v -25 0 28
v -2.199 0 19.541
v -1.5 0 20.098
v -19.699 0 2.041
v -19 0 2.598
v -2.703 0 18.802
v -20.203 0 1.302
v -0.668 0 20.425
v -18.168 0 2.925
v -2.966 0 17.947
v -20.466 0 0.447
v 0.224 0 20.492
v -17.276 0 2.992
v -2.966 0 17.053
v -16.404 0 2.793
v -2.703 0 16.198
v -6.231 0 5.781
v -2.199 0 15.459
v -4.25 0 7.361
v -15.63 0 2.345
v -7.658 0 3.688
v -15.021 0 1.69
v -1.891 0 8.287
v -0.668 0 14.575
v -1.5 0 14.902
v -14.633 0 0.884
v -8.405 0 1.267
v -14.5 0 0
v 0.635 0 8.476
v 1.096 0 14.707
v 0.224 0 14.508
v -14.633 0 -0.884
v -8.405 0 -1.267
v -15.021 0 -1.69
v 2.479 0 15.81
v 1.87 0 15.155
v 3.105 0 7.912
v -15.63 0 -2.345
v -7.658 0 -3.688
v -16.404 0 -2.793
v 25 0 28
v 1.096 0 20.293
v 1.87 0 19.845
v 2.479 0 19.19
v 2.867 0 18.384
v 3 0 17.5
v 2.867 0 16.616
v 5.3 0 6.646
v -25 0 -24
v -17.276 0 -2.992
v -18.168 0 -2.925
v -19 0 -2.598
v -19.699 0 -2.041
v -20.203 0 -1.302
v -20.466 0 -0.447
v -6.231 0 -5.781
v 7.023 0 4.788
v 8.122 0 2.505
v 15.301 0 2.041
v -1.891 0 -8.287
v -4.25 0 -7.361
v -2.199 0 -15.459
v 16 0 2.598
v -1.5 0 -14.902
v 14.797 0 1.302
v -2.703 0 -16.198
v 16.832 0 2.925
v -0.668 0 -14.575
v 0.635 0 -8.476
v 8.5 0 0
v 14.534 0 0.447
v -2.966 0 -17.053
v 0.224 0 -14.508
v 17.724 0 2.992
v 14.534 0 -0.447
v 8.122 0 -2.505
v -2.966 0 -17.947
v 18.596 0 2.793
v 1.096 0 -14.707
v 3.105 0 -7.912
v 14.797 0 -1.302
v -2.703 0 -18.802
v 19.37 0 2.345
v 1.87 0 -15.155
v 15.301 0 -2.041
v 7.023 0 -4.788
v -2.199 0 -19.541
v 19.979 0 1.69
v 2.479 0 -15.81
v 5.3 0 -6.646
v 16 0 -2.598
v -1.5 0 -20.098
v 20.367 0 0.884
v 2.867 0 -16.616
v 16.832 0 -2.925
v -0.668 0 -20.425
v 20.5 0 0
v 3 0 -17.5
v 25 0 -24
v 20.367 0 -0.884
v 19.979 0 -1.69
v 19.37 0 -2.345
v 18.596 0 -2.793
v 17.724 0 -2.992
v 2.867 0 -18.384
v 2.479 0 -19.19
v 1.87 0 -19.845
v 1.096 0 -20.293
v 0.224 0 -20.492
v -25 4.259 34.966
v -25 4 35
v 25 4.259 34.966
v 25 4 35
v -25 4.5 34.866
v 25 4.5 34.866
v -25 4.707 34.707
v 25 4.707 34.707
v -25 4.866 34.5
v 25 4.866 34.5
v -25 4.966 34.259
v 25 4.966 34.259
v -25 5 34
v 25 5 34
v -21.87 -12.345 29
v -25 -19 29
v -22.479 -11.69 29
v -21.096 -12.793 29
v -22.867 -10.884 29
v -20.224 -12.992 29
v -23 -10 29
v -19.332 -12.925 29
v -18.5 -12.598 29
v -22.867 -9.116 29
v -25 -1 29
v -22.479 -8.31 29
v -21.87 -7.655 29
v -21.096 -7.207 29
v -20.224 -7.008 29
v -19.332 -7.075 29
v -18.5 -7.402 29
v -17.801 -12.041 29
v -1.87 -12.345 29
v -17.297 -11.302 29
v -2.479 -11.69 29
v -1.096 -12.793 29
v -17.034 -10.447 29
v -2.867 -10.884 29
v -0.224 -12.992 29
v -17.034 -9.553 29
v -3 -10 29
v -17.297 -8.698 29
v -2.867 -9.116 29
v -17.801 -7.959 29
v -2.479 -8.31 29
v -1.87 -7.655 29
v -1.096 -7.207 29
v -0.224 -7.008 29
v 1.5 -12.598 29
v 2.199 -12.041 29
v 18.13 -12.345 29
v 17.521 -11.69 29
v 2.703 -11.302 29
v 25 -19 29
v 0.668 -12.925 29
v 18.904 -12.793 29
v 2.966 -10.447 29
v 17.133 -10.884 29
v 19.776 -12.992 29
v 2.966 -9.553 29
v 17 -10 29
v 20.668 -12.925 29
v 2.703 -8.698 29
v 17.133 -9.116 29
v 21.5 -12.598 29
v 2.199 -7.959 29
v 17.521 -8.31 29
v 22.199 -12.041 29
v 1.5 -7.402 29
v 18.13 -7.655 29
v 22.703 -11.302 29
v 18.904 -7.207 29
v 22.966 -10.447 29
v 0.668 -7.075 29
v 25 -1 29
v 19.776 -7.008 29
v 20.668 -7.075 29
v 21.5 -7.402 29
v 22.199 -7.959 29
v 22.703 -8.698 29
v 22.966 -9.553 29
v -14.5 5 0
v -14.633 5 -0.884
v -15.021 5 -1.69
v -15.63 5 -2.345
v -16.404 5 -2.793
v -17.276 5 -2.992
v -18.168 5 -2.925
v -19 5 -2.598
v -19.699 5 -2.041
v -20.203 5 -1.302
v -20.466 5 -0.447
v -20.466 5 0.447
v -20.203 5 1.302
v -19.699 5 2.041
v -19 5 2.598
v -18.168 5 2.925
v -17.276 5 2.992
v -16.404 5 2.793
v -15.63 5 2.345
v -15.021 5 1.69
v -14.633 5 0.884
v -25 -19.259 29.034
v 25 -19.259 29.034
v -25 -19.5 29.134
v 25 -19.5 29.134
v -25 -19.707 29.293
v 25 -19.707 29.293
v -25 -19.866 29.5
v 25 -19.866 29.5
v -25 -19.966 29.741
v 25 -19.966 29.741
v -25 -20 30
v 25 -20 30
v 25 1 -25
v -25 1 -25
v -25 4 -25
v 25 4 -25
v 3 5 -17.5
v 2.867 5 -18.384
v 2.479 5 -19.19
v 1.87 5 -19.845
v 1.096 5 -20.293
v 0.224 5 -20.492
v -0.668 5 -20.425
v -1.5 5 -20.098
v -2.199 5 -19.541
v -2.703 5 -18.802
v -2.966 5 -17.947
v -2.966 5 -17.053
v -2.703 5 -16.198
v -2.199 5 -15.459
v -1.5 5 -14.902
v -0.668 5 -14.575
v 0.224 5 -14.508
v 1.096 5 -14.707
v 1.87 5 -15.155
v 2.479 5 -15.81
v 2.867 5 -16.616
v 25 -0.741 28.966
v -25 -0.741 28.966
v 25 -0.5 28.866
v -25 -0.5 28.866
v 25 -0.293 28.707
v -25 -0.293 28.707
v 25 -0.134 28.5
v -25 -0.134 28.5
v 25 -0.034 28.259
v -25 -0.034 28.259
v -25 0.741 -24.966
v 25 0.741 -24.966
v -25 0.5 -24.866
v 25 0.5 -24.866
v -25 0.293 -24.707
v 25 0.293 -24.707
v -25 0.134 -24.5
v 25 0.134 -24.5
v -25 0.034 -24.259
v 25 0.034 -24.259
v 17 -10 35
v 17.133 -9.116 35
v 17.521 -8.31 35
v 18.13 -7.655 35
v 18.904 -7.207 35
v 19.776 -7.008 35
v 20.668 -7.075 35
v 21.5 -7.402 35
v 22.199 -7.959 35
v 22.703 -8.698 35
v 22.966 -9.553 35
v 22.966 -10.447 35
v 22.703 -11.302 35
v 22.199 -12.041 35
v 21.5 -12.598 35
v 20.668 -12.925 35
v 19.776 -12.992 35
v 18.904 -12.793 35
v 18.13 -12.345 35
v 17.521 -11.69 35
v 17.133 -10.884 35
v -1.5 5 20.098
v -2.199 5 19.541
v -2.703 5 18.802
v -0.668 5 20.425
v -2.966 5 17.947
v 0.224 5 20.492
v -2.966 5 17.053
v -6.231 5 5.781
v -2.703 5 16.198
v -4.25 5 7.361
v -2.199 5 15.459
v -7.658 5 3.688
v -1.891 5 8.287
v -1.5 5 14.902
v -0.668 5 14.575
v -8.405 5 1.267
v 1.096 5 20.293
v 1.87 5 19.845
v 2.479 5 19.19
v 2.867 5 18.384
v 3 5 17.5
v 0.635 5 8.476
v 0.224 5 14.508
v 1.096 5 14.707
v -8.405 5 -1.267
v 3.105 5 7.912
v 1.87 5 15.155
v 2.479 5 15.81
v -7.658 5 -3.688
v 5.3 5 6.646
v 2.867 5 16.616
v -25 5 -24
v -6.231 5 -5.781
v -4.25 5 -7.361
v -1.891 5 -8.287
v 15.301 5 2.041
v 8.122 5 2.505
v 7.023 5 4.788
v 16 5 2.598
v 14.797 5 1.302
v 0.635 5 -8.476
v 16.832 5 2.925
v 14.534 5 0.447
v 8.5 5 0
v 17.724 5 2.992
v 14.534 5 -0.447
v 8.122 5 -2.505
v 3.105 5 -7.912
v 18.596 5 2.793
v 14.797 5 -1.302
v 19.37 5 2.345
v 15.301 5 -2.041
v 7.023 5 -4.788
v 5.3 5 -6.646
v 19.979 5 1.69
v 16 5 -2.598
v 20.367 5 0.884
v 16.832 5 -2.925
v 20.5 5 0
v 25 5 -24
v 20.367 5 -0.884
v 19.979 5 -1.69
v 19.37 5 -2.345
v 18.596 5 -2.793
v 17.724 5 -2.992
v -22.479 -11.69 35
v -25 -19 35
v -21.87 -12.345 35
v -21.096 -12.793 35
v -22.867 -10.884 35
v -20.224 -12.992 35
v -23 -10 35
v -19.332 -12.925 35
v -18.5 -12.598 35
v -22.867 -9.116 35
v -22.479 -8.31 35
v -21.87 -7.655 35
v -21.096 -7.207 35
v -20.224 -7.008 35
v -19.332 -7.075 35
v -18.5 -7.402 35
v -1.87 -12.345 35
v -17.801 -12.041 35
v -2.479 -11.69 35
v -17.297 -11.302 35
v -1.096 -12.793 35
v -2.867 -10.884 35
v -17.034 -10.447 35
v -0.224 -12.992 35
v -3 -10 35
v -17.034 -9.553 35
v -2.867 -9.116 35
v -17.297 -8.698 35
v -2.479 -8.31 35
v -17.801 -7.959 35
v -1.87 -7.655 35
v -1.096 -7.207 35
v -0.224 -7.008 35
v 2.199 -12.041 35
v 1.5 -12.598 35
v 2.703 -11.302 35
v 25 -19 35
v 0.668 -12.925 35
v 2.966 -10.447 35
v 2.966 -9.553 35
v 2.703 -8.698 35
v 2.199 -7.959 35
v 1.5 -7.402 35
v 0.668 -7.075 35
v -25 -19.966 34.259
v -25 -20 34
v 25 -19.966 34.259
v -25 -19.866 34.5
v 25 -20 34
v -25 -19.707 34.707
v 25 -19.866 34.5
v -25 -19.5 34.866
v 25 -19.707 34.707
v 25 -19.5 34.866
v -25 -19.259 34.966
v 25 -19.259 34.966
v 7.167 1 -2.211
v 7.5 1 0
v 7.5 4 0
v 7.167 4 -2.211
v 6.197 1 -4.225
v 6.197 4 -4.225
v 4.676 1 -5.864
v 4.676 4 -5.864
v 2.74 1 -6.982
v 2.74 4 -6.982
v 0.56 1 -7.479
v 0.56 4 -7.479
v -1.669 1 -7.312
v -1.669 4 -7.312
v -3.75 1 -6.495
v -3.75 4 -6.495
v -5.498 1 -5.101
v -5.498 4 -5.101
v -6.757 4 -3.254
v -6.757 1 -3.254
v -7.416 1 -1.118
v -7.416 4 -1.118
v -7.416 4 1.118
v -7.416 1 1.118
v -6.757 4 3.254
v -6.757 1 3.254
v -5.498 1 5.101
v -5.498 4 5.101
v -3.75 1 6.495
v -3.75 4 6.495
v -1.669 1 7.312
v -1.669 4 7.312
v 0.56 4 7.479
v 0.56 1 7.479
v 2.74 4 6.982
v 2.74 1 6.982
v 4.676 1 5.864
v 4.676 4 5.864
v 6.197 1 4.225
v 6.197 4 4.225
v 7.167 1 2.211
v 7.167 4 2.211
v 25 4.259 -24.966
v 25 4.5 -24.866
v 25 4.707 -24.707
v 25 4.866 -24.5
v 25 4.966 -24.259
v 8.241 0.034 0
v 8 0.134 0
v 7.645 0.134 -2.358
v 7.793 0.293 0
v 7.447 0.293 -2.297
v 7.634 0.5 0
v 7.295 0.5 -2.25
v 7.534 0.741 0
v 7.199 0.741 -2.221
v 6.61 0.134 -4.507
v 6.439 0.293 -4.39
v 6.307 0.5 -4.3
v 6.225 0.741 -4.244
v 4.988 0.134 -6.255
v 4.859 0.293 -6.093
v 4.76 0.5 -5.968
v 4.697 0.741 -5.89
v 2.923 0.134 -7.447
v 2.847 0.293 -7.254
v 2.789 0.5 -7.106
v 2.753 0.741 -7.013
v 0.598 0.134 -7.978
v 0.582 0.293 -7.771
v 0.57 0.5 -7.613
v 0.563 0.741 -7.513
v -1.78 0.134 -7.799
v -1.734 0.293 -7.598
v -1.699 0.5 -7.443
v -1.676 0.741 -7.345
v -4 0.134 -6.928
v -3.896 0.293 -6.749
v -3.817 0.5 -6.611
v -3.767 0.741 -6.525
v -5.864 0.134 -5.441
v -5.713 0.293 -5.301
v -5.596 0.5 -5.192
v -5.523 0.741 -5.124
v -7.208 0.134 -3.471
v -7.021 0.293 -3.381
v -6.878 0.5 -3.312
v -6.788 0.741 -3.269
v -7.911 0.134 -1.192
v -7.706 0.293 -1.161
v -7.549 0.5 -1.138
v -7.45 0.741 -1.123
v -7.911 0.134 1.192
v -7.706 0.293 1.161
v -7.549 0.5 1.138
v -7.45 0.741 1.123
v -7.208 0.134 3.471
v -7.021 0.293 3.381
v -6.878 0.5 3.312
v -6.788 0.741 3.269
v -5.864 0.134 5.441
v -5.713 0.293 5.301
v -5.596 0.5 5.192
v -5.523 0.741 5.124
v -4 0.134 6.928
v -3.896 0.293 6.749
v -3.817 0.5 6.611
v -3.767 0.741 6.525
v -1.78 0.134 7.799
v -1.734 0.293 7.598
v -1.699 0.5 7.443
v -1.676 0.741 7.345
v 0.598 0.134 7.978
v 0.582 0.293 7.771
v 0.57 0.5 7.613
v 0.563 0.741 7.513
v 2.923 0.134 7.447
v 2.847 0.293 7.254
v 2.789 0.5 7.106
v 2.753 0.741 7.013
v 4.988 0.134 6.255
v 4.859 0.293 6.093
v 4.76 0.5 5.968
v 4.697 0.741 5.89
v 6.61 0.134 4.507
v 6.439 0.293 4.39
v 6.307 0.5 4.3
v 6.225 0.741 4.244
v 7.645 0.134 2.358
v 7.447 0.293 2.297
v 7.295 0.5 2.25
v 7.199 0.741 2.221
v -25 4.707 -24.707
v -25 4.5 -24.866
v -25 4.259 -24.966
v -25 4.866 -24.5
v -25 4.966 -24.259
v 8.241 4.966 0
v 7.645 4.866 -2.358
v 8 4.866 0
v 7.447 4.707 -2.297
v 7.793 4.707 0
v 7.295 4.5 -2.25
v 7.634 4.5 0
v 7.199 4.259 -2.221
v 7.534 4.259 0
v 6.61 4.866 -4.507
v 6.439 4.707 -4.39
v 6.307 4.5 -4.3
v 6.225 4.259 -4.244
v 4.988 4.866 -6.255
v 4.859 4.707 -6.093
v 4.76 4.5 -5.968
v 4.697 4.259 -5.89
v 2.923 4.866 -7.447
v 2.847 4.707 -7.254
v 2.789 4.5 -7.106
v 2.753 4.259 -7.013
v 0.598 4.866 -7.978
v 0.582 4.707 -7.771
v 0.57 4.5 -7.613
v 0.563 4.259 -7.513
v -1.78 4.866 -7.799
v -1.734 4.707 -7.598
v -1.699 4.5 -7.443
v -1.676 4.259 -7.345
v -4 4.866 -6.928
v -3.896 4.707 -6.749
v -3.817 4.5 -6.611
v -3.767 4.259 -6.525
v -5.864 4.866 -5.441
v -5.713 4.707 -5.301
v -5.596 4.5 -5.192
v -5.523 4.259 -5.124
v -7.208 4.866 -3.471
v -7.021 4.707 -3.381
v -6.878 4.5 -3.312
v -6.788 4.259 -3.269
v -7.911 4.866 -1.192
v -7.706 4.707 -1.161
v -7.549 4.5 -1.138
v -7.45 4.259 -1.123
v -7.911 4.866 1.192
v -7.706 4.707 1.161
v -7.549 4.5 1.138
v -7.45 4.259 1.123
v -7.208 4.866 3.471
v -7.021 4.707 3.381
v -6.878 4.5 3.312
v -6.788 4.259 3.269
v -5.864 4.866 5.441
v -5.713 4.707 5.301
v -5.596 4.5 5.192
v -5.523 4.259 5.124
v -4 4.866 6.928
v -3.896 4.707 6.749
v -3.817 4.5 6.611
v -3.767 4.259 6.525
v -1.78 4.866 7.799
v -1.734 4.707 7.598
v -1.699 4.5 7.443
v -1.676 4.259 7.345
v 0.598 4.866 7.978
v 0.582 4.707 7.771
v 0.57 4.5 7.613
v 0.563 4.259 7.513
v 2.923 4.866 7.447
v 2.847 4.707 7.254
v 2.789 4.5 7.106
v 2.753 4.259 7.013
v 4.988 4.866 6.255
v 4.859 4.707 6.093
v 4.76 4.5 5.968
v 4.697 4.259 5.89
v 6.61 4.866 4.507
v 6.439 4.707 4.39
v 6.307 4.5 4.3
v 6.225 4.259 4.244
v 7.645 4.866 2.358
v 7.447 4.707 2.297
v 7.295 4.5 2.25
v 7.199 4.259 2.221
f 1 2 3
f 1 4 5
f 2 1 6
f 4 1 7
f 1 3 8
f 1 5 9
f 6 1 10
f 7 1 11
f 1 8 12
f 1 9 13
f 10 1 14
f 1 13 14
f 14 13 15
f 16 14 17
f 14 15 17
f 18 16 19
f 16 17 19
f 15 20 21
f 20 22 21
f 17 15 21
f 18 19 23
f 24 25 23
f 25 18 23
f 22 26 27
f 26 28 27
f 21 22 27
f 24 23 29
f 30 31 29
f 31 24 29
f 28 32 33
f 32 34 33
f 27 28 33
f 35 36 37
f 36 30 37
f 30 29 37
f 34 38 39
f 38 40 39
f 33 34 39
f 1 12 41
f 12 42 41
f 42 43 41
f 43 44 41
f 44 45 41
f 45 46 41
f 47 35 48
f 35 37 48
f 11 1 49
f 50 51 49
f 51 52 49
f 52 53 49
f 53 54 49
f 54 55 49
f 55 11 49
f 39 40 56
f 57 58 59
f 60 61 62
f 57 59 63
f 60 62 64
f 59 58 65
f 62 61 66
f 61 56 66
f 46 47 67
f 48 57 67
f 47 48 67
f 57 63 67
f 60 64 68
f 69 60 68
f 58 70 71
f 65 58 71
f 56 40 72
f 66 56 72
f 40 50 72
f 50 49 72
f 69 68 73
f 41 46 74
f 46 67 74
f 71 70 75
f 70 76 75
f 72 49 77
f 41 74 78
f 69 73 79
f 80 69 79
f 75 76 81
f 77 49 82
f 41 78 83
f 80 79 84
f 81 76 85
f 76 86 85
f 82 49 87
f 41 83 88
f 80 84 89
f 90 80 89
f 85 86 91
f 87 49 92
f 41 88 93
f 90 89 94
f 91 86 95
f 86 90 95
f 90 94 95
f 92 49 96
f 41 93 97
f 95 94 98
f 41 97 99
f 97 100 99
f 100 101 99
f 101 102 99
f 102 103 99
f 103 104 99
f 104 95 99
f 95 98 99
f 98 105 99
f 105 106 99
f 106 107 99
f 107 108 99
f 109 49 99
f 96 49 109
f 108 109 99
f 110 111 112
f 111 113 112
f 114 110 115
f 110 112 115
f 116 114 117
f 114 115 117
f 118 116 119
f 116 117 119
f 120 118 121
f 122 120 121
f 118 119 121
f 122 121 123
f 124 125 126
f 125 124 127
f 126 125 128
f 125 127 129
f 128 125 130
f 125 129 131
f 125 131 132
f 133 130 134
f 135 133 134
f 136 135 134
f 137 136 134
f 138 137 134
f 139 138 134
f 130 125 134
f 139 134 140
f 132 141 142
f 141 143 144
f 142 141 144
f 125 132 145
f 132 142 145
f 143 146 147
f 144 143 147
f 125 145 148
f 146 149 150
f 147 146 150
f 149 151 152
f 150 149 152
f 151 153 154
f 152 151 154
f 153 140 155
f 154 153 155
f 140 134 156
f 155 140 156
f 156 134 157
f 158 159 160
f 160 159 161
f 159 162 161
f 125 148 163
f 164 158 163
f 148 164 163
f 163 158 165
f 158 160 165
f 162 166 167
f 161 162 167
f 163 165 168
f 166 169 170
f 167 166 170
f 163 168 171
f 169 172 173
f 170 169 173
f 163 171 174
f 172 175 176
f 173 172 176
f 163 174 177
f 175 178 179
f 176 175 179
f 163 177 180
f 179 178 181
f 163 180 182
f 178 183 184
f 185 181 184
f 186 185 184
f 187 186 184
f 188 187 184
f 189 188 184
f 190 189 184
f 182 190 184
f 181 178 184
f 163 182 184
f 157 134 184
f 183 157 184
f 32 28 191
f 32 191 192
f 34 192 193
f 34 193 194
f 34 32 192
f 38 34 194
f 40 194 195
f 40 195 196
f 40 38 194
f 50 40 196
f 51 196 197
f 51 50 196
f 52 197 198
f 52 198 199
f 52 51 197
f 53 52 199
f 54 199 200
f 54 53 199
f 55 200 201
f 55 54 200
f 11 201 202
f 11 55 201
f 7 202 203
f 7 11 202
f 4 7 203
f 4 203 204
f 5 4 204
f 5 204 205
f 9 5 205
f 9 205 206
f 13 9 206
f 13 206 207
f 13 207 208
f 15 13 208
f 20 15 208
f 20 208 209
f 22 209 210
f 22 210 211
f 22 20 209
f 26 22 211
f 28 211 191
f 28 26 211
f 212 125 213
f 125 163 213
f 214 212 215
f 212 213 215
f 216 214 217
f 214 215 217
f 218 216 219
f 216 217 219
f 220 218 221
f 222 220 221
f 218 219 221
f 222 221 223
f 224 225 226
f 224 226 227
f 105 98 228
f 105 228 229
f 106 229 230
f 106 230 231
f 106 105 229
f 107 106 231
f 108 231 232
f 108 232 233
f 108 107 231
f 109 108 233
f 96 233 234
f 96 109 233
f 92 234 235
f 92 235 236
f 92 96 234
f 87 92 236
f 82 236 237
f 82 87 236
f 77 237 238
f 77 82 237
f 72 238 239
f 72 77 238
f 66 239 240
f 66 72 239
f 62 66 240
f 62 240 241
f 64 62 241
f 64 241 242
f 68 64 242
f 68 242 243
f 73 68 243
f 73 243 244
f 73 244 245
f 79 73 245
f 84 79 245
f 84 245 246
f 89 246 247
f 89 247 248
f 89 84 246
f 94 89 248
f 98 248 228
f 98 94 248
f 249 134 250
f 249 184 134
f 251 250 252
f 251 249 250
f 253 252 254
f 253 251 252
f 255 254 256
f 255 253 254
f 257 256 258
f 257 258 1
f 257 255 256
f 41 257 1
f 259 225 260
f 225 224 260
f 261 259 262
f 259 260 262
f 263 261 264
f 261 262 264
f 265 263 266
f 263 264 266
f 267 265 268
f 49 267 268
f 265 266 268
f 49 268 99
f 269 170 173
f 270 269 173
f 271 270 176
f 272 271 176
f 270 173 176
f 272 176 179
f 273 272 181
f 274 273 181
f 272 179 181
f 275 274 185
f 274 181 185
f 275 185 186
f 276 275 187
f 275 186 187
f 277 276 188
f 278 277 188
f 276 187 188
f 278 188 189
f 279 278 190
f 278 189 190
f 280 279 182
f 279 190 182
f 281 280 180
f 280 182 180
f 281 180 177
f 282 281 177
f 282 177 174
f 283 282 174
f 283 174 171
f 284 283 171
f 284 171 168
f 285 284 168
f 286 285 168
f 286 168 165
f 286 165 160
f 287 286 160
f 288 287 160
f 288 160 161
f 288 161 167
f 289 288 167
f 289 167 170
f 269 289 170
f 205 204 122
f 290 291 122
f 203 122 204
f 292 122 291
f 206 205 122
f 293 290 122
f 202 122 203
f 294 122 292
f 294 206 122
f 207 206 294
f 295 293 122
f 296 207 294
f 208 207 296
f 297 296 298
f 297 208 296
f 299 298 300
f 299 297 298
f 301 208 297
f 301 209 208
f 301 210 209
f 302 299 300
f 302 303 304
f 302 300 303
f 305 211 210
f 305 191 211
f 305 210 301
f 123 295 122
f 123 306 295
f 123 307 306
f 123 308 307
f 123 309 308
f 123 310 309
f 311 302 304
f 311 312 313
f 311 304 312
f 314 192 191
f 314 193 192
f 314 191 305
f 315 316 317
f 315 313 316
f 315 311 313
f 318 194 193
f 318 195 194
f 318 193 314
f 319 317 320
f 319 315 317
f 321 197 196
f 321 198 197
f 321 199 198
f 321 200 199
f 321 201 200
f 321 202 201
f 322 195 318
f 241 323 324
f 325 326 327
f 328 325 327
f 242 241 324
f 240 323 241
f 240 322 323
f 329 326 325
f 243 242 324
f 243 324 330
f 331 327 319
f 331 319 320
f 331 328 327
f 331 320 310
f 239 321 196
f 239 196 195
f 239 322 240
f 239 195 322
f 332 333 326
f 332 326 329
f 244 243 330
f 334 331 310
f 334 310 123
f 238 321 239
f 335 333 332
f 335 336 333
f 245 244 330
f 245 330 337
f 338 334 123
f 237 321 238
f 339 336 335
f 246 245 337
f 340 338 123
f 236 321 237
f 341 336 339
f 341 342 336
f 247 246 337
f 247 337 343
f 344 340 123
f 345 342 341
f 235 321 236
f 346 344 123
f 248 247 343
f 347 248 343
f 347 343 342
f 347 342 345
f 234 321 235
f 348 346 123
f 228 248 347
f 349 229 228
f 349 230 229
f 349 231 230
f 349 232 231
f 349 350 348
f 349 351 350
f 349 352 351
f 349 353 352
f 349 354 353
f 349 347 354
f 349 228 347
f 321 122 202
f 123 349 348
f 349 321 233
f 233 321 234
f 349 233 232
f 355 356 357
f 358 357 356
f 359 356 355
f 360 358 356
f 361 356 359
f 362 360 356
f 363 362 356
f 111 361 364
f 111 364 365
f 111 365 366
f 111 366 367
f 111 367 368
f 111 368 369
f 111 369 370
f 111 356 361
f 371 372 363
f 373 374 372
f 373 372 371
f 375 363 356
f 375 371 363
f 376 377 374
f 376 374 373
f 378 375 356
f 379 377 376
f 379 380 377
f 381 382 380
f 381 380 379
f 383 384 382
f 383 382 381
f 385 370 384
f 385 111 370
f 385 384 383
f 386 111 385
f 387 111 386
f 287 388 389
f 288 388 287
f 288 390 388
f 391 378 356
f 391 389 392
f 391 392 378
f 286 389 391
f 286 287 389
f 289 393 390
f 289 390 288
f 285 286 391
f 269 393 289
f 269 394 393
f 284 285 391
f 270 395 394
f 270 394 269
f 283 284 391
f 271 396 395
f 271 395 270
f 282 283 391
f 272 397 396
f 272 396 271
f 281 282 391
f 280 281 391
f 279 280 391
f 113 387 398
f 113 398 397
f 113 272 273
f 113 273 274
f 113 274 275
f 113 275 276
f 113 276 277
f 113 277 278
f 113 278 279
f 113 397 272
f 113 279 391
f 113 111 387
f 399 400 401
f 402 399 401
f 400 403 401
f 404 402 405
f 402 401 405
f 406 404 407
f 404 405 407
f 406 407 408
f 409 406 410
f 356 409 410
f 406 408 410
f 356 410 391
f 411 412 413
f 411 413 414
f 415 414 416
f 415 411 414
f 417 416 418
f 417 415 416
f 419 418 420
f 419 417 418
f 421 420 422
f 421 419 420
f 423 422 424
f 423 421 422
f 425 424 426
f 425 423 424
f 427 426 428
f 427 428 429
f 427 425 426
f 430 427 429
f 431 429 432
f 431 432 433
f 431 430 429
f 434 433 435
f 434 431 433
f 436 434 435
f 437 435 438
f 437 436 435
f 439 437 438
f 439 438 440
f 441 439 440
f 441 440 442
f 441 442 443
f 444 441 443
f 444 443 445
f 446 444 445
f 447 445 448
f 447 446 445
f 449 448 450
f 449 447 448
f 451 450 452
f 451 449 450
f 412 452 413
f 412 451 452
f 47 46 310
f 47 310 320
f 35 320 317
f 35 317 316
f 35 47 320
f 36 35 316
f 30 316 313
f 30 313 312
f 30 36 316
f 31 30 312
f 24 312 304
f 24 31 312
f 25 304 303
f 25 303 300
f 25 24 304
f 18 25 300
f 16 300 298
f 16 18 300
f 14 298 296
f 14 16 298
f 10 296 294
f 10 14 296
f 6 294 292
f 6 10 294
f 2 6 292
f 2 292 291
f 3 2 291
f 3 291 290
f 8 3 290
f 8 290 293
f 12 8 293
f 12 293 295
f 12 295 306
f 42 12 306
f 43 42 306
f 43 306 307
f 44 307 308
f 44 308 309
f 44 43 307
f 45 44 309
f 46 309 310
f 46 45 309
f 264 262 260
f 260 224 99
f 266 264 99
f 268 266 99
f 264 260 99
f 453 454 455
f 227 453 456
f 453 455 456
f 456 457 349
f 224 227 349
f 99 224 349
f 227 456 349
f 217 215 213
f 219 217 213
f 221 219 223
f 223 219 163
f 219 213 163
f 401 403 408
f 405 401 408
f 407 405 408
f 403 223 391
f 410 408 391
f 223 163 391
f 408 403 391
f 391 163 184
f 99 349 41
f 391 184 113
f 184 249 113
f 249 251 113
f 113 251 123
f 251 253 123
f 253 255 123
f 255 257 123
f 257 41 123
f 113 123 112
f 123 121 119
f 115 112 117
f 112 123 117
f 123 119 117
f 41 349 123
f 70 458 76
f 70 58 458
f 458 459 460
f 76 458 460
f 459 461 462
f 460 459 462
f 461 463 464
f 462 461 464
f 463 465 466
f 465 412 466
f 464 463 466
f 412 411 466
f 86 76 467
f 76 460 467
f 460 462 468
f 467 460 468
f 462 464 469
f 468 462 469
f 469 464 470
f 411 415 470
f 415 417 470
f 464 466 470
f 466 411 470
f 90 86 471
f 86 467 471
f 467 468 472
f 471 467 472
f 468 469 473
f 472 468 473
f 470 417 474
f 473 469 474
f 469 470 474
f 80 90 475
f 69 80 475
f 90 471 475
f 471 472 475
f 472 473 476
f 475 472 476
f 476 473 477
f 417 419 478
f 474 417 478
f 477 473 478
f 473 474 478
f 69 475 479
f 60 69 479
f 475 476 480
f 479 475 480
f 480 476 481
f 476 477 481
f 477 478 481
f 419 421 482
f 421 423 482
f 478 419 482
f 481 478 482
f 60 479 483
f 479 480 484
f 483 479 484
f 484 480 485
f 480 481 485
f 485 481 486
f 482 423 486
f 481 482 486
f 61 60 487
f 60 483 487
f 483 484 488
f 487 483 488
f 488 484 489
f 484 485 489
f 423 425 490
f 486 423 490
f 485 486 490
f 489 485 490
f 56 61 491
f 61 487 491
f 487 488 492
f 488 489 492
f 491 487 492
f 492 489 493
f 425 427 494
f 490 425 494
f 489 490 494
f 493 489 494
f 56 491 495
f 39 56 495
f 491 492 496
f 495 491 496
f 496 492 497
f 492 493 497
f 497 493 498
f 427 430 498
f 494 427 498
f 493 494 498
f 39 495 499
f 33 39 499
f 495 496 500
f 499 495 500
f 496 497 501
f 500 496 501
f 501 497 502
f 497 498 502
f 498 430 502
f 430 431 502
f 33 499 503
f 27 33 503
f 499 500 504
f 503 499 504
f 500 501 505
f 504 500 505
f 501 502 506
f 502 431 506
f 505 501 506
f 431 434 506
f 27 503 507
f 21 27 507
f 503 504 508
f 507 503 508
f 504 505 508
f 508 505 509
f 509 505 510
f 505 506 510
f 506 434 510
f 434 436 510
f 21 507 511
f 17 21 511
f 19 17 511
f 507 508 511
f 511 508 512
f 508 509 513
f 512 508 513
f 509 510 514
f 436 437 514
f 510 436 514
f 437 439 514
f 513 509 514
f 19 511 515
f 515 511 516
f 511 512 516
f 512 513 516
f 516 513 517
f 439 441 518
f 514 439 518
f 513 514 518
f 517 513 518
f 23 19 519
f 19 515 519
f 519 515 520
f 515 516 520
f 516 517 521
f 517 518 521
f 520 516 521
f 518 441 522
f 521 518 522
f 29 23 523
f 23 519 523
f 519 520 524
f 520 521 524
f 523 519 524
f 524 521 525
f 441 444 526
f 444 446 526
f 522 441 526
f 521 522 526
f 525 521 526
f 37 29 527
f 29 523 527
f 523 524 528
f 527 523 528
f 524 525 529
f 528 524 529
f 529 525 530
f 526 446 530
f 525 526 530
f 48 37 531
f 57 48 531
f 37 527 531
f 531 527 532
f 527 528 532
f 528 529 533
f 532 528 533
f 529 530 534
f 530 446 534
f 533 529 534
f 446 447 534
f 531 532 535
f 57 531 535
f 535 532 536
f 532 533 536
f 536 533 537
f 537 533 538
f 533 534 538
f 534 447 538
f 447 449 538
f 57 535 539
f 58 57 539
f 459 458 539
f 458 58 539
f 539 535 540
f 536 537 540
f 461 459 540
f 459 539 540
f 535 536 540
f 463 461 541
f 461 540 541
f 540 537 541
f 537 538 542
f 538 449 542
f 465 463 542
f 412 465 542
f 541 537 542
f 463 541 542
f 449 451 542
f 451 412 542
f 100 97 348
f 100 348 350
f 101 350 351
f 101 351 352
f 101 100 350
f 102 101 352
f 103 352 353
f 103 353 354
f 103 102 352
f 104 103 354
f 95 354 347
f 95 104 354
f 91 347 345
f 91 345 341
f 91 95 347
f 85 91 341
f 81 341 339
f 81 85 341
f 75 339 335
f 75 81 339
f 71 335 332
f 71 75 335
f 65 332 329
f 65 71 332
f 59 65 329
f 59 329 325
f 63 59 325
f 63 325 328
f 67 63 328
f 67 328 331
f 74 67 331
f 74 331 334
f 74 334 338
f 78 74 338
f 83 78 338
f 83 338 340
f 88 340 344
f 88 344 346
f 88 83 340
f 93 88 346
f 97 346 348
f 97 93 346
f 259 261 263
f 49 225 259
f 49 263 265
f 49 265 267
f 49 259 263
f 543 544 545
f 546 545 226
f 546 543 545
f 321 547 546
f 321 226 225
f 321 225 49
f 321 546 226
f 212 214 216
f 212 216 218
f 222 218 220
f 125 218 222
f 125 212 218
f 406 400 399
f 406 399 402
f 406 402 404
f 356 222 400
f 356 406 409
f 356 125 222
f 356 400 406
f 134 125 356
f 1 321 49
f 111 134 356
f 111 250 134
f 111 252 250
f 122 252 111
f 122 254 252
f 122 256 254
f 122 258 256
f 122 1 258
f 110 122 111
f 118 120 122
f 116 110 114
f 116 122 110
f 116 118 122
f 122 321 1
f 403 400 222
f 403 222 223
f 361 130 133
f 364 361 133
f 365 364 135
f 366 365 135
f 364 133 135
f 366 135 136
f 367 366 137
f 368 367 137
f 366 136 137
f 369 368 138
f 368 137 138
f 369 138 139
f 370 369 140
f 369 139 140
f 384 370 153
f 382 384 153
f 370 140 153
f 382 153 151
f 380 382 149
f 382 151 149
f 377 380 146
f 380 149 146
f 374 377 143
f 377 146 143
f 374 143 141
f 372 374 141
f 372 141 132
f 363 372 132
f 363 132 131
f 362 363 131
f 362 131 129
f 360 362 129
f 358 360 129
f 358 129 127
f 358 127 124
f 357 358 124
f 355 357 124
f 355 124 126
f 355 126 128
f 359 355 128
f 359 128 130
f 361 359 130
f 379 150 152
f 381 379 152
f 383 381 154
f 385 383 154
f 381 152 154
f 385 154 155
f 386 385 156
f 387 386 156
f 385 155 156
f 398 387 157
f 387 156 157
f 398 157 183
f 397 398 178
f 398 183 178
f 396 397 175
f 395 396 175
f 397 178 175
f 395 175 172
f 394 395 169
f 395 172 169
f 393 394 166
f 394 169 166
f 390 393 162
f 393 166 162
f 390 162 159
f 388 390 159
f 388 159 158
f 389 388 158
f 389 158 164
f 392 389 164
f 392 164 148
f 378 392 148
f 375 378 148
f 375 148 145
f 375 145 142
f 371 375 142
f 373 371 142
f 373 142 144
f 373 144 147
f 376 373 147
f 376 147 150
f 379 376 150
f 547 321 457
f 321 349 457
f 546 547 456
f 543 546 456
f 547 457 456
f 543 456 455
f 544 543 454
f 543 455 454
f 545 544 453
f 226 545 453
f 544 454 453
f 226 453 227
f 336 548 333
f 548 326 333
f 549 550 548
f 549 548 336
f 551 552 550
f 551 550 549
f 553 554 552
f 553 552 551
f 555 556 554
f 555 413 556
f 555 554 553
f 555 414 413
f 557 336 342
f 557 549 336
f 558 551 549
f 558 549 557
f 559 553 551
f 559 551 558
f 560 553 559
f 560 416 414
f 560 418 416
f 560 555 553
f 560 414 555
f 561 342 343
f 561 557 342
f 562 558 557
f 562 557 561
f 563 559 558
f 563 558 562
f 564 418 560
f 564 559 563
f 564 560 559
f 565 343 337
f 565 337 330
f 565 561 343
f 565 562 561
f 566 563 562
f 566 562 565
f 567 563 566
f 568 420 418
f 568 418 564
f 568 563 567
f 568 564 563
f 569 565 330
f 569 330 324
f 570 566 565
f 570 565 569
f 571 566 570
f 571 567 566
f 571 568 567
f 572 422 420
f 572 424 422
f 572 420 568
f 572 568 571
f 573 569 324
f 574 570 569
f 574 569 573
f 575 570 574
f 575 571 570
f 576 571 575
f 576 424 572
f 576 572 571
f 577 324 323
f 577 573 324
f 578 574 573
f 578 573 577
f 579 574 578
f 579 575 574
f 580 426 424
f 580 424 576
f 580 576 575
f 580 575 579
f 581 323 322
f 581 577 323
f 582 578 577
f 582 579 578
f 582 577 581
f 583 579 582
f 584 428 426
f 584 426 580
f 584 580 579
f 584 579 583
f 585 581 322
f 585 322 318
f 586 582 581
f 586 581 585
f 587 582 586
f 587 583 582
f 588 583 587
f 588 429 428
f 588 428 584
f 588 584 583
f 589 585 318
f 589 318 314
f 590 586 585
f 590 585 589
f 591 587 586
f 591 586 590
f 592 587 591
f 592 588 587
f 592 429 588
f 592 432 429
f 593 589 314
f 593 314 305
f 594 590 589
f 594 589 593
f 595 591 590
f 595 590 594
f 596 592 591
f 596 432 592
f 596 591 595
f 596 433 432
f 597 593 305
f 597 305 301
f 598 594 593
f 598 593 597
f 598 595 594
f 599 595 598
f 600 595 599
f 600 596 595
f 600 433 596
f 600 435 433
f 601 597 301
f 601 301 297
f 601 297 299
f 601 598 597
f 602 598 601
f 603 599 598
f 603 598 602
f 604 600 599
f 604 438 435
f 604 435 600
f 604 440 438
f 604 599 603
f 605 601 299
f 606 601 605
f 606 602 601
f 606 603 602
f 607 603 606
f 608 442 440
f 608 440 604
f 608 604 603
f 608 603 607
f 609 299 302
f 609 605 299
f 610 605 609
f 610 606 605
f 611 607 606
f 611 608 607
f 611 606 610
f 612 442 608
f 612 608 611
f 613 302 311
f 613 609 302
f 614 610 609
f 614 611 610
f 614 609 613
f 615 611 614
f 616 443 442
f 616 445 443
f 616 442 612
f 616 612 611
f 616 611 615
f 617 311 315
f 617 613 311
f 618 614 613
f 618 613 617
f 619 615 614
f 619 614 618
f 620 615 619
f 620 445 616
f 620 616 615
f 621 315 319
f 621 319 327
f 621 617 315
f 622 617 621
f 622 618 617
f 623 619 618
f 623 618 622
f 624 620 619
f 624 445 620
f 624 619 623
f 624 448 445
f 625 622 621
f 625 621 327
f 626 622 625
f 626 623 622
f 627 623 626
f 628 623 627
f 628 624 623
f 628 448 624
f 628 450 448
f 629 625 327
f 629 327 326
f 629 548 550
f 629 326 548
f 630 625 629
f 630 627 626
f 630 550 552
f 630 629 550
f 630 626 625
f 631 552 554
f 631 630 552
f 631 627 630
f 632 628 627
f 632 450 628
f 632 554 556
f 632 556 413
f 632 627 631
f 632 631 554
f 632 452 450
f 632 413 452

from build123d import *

# Parameters (mm, degrees)
SKETCH1_W           = 50
SKETCH1_H           = 50
SKETCH1_R           = 7.5
SKETCH1_R_2         = 3
BOSS_EXTRUDE1_DEPTH = 5
SKETCH2_W           = 50
SKETCH2_H           = 5
BOSS_EXTRUDE2_DEPTH = 10
SKETCH4_W           = 50
SKETCH4_H           = 6
BOSS_EXTRUDE3_DEPTH = 20
SKETCH5_R           = 3
CUT_EXTRUDE1_DEPTH  = 7
FILLET1_R           = 1


with BuildPart() as part:
    # Sketch1 → Boss-Extrude1 (new body)
    with BuildSketch(Plane(origin=(0, 0, 0), x_dir=(1, 0, 0), z_dir=(0, 1, 0))):
        Rectangle(SKETCH1_W, SKETCH1_H)
        Circle(SKETCH1_R, mode=Mode.SUBTRACT)
        with Locations((0, 17.5)):
            Circle(SKETCH1_R_2, mode=Mode.SUBTRACT)
        with Locations((17.5, 0)):
            Circle(SKETCH1_R_2, mode=Mode.SUBTRACT)
        with Locations((0, -17.5)):
            Circle(SKETCH1_R_2, mode=Mode.SUBTRACT)
        with Locations((-17.5, 0)):
            Circle(SKETCH1_R_2, mode=Mode.SUBTRACT)
    extrude(amount=BOSS_EXTRUDE1_DEPTH)

    # Sketch2 → Boss-Extrude2 (add)
    with BuildSketch(Plane.XY.offset(25)):
        with Locations((0, 2.5)):
            Rectangle(SKETCH2_W, SKETCH2_H)
    extrude(amount=BOSS_EXTRUDE2_DEPTH)

    # Sketch4 → Boss-Extrude3 (add)
    with BuildSketch(Plane.XZ):
        with Locations((0, 32)):
            Rectangle(SKETCH4_W, SKETCH4_H)
    extrude(amount=BOSS_EXTRUDE3_DEPTH)

    # Sketch5 → Cut-Extrude1 (cut, through all)
    with BuildSketch(Plane(origin=(0, 0, 29), x_dir=(-1, 0, 0), z_dir=(0, 0, -1))):
        with Locations((0, -10)):
            Circle(SKETCH5_R)
        with Locations((20, -10)):
            Circle(SKETCH5_R)
        with Locations((-20, -10)):
            Circle(SKETCH5_R)
    extrude(amount=-CUT_EXTRUDE1_DEPTH, mode=Mode.SUBTRACT)

    # Fillet1
    fillet1_edges = [part.edges().sort_by_distance(p)[0] for p in [
        (-7.5, 0, 0),
        (-7.5, 5, 0),
        (0, 5, 35),
        (0, 0, 29),
        (0, -20, 29),
        (0, -20, 35),
        (0, 0, -25),
        (0, 5, -25),
    ]]
    fillet(fillet1_edges, radius=FILLET1_R)


solid = part.part
